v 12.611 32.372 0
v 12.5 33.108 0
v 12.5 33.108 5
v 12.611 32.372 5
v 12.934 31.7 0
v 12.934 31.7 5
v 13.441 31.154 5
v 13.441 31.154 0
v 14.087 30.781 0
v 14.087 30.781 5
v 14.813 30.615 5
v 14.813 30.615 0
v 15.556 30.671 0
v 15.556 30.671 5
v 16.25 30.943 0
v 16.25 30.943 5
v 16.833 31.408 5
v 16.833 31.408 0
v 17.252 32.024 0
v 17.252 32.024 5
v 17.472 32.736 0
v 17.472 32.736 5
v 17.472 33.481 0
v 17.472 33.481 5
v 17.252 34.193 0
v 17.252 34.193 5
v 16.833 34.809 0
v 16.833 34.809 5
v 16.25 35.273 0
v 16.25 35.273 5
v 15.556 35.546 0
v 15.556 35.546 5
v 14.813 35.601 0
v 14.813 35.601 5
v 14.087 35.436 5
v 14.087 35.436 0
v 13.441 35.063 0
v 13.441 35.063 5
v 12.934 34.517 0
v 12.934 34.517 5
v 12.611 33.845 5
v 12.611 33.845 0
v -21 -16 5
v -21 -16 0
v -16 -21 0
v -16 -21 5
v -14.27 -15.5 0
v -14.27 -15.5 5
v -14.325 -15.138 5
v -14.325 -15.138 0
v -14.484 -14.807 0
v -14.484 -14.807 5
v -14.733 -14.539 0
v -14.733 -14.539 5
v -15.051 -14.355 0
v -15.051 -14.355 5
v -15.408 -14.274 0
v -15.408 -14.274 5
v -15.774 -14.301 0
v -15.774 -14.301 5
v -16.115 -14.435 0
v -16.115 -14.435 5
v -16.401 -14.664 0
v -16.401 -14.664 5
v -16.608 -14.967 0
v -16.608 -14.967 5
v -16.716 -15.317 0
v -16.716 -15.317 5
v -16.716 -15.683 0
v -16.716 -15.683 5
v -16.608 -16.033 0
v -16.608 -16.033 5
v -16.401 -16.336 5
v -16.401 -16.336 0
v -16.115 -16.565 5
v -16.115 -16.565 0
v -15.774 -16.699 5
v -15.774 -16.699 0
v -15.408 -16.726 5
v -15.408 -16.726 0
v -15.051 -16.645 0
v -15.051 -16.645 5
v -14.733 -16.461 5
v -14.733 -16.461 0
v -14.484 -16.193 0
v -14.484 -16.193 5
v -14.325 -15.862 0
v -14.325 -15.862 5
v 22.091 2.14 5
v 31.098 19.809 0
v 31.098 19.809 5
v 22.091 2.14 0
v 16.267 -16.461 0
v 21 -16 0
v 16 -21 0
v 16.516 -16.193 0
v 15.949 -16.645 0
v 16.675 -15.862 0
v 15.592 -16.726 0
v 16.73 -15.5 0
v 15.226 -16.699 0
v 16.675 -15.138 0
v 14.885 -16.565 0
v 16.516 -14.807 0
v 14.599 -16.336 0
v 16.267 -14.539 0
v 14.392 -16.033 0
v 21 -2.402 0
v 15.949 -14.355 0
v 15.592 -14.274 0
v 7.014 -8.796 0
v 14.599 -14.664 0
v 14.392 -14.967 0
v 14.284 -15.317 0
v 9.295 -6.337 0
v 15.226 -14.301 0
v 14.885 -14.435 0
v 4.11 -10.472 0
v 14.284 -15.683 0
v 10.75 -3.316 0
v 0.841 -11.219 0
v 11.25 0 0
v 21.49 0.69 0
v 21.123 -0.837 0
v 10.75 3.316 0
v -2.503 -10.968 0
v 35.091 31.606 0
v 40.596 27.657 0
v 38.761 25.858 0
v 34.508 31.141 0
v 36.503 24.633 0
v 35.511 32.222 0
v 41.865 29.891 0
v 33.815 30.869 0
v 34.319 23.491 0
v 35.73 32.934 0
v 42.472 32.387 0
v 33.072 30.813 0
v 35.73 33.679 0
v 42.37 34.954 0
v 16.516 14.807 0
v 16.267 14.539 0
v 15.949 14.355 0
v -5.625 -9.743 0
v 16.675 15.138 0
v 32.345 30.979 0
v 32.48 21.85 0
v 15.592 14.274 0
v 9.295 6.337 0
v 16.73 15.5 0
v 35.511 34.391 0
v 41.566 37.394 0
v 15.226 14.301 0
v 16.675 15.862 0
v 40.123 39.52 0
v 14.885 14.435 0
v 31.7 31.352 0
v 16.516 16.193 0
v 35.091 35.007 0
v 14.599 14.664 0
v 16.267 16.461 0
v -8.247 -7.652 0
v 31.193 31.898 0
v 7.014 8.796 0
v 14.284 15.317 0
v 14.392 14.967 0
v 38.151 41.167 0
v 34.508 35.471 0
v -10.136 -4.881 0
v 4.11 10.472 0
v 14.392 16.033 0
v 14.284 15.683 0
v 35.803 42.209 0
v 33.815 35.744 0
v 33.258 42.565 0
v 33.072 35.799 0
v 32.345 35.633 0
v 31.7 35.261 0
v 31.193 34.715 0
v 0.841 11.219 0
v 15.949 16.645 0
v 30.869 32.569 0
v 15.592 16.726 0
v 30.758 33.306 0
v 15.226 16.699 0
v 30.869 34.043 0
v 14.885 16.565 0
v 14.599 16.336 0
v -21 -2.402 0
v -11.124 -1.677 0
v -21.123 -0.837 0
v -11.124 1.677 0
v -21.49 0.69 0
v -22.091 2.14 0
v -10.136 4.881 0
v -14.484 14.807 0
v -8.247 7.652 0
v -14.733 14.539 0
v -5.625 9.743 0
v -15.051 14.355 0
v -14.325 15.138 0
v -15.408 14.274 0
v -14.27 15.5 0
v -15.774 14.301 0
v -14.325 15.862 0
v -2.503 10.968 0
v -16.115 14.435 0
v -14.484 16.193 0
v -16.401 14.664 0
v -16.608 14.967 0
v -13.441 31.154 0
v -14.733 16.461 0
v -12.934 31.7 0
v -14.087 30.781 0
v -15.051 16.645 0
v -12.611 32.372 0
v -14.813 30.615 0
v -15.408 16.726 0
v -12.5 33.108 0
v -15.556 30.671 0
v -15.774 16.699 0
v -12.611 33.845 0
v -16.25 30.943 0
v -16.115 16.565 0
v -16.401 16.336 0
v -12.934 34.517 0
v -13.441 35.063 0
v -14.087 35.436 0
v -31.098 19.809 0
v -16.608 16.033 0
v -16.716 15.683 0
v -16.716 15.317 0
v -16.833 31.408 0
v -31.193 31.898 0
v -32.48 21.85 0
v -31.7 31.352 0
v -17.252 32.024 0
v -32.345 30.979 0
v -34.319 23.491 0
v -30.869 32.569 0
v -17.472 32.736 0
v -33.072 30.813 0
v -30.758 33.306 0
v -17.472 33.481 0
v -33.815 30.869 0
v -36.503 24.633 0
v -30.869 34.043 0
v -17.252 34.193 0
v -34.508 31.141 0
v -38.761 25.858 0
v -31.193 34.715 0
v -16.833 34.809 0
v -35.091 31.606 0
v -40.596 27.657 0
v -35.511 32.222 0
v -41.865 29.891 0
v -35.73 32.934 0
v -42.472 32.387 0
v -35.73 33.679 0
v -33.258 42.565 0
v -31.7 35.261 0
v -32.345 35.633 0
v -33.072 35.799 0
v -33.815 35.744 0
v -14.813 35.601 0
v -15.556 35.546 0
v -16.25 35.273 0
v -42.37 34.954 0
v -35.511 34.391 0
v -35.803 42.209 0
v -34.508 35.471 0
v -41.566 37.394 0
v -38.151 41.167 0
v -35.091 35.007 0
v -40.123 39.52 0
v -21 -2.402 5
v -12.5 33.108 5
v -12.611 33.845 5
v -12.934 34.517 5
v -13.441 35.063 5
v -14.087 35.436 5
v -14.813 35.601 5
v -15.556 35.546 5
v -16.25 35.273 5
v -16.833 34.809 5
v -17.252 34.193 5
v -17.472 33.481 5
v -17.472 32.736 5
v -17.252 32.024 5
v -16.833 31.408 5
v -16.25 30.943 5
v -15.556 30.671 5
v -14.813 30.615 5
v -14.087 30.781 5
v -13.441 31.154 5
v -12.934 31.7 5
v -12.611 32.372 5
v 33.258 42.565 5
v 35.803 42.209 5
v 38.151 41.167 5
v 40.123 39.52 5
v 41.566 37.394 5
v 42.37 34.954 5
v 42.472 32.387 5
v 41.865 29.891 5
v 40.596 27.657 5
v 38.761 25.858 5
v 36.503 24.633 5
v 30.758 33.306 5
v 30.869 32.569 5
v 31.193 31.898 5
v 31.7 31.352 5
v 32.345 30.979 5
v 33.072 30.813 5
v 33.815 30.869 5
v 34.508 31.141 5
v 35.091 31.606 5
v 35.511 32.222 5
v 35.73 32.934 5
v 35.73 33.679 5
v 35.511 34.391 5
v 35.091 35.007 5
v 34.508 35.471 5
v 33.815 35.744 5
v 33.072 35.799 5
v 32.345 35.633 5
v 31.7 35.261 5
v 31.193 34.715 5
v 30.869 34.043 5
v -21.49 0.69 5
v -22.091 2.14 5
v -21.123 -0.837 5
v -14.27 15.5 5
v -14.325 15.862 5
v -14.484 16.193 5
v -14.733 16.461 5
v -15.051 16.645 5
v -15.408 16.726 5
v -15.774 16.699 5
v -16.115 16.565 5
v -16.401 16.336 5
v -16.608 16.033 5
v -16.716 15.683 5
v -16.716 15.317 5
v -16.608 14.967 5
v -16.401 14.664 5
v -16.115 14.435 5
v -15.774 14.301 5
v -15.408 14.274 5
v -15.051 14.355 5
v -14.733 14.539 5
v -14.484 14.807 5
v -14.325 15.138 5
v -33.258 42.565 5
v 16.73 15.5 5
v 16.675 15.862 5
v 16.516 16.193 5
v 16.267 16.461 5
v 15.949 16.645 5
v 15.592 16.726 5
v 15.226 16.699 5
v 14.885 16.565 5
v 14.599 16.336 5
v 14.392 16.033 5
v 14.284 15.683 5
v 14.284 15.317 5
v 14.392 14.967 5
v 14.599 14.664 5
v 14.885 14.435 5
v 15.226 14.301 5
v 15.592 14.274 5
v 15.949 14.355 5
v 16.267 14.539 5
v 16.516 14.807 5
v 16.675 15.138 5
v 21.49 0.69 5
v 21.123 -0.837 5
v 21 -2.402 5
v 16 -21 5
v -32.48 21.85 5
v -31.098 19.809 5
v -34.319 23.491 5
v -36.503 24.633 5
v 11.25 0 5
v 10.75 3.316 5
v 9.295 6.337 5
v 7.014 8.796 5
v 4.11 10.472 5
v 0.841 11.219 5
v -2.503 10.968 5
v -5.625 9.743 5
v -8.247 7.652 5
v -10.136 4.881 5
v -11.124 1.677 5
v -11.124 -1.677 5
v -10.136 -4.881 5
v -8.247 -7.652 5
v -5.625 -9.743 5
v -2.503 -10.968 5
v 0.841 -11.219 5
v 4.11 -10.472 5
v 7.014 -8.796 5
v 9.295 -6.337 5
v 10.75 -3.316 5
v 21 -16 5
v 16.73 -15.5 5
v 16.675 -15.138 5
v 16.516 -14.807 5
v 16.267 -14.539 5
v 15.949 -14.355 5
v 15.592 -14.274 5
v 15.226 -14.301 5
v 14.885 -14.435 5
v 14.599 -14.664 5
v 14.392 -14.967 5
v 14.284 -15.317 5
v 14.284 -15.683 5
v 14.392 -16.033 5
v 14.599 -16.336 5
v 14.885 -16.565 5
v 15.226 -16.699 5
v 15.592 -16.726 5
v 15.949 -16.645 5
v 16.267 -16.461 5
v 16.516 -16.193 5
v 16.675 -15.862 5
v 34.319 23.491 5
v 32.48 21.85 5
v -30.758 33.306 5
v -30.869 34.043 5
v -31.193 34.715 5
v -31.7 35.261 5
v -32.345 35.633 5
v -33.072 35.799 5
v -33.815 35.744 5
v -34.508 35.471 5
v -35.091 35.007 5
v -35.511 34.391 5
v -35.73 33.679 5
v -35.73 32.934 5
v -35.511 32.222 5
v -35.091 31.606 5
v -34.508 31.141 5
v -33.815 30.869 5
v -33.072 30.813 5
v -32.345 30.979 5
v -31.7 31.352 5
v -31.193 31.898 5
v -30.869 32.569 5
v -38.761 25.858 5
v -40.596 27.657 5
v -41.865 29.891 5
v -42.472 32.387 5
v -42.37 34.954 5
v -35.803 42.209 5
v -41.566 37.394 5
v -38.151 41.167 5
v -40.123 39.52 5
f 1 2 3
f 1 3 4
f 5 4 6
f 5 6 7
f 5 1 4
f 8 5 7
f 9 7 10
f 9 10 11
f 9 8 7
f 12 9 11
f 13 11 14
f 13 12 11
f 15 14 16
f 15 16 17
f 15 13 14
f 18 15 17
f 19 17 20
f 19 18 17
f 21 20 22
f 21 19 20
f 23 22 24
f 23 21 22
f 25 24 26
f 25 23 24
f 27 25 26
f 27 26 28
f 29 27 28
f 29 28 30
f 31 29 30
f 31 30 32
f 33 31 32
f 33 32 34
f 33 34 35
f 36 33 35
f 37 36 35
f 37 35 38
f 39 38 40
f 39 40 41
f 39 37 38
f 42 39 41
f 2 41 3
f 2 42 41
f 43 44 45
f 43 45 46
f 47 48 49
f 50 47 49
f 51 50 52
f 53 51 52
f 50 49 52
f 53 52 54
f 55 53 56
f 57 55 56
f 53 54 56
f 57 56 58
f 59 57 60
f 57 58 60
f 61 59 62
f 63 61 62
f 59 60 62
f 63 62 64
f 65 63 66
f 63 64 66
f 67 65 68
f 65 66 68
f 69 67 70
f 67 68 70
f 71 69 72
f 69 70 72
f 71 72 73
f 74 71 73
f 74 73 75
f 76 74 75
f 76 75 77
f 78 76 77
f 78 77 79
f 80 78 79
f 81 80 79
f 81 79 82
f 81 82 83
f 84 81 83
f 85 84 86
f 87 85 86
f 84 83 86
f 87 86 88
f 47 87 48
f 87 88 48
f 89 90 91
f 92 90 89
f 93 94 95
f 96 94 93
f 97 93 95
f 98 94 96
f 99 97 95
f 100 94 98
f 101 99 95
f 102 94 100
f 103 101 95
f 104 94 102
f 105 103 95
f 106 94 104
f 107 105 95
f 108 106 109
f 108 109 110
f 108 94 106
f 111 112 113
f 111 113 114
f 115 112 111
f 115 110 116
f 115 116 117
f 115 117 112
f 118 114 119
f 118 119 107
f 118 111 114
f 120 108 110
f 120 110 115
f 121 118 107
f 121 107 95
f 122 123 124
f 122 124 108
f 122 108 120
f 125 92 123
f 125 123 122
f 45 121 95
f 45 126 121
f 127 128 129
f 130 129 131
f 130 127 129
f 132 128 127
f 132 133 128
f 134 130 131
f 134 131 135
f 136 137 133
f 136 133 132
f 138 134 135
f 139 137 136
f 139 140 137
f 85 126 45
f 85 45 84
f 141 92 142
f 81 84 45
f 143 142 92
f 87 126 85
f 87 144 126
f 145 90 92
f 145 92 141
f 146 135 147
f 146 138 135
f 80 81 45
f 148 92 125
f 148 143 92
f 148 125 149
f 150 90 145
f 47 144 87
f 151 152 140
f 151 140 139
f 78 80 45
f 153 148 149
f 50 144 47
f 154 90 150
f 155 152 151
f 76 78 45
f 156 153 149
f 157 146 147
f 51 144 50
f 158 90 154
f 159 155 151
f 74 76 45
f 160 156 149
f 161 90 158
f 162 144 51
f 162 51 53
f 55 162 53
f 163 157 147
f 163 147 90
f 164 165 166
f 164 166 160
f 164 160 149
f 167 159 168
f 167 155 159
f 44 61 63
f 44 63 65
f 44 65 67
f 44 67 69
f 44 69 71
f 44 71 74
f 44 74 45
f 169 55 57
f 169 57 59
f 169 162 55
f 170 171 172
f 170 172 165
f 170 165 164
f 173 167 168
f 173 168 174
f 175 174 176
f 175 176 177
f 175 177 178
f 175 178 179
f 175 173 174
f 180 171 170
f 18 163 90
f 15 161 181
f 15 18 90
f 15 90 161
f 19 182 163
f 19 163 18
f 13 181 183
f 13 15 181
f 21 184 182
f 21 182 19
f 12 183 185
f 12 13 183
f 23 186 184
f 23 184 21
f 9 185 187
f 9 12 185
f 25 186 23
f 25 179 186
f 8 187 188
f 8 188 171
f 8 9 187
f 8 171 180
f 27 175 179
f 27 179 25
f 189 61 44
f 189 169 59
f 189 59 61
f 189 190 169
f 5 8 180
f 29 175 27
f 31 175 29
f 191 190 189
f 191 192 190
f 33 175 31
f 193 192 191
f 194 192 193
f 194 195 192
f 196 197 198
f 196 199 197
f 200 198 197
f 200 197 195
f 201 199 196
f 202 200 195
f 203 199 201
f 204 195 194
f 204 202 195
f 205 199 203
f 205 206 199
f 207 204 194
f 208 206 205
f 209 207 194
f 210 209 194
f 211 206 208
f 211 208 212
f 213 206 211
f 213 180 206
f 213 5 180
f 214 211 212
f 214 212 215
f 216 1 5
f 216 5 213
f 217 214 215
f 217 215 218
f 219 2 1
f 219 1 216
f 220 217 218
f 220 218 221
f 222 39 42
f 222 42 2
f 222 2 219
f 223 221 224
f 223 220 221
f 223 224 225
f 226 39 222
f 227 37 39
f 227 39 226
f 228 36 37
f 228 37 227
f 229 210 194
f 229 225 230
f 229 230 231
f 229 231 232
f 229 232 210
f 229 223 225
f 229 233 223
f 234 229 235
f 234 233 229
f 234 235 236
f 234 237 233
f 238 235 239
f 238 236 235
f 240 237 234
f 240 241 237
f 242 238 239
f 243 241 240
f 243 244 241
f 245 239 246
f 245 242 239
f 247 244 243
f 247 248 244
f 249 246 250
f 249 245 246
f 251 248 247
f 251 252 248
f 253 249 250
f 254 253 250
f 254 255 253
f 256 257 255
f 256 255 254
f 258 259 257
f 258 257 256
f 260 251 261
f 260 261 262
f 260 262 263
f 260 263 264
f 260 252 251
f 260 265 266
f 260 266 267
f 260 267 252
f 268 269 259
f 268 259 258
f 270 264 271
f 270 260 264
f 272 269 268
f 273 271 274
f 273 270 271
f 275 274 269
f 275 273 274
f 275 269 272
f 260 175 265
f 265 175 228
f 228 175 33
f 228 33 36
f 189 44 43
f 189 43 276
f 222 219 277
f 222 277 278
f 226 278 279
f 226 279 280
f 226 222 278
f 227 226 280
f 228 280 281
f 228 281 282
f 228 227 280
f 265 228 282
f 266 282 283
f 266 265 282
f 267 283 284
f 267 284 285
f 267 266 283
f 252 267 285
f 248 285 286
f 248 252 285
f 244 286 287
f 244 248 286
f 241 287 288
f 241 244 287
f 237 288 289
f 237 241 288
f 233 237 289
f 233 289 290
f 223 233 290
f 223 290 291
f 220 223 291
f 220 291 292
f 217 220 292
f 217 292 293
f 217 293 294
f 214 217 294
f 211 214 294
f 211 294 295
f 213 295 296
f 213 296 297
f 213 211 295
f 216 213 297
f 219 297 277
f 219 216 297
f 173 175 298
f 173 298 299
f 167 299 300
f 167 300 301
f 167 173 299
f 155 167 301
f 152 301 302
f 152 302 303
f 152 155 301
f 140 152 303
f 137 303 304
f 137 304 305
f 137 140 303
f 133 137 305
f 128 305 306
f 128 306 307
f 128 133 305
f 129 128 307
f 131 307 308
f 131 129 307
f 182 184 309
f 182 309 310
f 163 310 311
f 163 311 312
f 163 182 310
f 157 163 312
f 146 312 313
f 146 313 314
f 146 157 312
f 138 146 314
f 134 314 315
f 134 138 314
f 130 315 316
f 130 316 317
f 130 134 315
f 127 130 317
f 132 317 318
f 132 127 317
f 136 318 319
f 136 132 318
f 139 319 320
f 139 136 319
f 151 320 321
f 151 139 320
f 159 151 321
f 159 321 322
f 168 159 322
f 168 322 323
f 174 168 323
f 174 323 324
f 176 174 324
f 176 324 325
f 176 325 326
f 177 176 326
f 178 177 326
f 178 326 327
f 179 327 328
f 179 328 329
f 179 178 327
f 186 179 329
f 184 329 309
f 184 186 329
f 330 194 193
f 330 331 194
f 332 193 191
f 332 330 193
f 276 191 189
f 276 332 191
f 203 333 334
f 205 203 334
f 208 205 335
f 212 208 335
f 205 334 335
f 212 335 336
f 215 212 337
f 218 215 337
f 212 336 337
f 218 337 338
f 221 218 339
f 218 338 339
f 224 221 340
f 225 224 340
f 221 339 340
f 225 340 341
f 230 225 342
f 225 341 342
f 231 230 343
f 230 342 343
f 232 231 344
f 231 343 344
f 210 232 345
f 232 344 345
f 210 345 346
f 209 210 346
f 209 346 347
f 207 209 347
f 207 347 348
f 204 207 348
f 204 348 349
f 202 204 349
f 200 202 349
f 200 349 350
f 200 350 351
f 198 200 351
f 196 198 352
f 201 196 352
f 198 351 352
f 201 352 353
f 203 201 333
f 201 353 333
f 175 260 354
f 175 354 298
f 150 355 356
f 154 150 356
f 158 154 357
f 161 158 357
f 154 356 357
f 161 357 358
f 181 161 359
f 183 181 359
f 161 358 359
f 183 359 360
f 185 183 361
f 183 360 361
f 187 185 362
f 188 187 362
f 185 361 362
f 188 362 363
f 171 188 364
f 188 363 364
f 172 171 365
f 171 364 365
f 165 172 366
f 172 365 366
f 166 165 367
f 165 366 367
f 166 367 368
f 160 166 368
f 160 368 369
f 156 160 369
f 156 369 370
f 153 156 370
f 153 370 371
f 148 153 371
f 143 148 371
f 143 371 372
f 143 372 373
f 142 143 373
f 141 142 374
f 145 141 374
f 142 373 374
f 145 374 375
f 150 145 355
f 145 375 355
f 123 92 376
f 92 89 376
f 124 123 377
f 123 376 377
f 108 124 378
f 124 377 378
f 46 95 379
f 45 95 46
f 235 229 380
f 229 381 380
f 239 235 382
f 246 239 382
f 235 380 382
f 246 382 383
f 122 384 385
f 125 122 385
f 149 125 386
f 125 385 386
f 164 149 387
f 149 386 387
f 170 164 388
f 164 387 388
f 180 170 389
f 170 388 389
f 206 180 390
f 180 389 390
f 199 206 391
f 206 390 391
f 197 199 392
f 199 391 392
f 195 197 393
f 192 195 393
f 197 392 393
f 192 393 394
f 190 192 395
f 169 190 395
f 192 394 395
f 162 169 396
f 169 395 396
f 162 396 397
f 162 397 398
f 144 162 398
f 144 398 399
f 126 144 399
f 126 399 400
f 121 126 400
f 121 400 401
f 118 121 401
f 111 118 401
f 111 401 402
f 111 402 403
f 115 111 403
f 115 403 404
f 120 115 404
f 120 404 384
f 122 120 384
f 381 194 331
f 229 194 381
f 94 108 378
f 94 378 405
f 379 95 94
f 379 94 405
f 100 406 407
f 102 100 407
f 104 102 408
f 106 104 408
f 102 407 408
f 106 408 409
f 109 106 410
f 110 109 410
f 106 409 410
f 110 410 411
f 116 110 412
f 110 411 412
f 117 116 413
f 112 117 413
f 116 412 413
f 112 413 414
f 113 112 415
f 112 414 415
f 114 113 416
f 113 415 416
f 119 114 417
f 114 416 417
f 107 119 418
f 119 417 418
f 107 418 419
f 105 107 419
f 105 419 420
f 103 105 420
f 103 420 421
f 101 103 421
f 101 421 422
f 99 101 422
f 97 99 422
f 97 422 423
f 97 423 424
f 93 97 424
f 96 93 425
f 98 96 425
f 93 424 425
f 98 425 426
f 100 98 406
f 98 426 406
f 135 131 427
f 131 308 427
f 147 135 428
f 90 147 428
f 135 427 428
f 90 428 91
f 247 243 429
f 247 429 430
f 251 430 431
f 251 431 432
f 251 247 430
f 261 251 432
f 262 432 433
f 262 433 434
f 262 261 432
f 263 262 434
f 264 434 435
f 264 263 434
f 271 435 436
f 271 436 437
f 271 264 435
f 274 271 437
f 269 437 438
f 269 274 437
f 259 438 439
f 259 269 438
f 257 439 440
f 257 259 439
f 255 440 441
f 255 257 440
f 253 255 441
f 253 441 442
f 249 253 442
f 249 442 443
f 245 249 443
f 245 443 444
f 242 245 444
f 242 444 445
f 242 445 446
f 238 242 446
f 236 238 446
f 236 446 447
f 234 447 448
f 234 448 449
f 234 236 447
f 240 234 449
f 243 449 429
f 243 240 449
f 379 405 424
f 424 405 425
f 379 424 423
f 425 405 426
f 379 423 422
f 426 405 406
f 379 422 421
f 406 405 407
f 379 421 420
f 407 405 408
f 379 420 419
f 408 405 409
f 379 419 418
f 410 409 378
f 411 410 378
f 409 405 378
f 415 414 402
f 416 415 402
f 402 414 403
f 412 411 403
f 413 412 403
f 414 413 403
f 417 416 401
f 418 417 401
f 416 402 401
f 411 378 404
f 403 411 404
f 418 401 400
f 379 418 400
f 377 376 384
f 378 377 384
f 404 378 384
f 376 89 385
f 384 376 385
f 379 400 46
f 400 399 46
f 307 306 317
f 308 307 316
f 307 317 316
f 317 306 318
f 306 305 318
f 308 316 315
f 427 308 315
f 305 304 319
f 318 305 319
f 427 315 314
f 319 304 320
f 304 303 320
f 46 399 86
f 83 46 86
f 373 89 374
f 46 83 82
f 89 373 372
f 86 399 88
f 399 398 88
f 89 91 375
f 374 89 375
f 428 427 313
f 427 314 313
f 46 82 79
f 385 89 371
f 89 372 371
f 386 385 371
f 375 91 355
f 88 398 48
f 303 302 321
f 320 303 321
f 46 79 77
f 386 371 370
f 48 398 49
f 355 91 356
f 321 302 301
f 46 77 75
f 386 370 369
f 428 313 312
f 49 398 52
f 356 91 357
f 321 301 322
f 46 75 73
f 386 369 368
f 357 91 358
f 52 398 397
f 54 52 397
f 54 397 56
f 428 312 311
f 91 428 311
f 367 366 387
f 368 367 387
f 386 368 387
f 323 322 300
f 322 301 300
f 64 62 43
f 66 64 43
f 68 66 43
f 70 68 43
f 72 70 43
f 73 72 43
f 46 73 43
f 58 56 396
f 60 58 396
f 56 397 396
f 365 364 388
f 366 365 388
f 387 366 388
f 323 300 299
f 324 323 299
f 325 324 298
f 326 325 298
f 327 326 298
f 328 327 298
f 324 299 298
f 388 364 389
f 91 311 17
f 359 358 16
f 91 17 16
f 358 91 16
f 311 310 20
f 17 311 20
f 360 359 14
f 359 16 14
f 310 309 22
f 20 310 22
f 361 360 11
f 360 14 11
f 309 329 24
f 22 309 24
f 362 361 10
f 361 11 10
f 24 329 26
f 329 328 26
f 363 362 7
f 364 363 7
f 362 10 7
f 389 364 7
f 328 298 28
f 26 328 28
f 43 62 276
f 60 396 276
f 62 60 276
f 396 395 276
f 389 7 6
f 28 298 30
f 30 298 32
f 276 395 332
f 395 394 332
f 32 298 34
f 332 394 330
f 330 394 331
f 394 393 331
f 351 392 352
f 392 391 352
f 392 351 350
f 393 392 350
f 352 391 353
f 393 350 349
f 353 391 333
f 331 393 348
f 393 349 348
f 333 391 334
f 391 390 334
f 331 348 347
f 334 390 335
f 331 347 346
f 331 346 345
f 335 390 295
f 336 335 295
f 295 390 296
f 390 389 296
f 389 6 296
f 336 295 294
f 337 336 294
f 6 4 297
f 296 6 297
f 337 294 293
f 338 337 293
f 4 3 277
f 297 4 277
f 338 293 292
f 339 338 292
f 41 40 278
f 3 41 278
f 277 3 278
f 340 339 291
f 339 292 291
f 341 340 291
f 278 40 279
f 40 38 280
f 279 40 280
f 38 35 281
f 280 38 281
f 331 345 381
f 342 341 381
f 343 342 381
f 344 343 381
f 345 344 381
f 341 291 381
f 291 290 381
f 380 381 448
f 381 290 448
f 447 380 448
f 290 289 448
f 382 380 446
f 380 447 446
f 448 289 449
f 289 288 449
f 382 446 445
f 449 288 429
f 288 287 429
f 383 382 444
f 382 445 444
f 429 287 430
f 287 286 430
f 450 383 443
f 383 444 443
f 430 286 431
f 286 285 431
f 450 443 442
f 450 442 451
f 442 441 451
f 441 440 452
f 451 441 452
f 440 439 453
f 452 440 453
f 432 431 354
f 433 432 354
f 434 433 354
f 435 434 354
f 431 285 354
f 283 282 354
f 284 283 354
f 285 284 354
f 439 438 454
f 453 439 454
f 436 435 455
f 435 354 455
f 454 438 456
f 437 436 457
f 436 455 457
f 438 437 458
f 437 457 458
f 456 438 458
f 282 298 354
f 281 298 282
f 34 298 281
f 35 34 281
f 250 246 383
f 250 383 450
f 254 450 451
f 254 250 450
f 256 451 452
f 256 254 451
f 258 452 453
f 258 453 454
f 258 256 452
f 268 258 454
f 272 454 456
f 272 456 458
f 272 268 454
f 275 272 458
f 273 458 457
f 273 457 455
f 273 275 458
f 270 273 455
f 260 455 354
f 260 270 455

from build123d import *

# Parameters (mm, degrees)
ESQUISSE1_R             = 7.48734248
ESQUISSE1_R_2           = 2.5
BOSS_EXTRU_1_DEPTH      = 5
ESQUISSE2_R             = 1.2295
ENL_V_MAT_EXTRU_1_DEPTH = 5
CONG_2_R                = 10
CONG_3_R                = 10
ESQUISSE3_R             = 11.25
ENL_V_MAT_EXTRU_2_DEPTH = 10
CHANFREIN1_SIZE         = 5


with BuildPart() as part:
    # Esquisse1 → Boss.-Extru.1 (new body)
    with BuildSketch(Plane.XY):
        with BuildLine():
            Line((-33.258331918, 42.564920159), (33.258331918, 42.564920159))
            ThreePointArc((33.258331918, 42.564920159), (42.517839876, 33.305412201), (33.258331918, 24.045904244))
            Line((33.258331918, 24.045904244), (21, 0))
            Line((21, 0), (21, -21))
            Line((21, -21), (-21, -21))
            Line((-21, -21), (-21, 0))
            Line((-21, 0), (-33.258331918, 24.045904244))
            ThreePointArc((-33.258331918, 24.045904244), (-42.517839876, 33.305412201), (-33.258331918, 42.564920159))
        make_face()
        Circle(ESQUISSE1_R, mode=Mode.SUBTRACT)
        with Locations((-33.258331918, 33.306233754)):
            Circle(ESQUISSE1_R_2, mode=Mode.SUBTRACT)
        with Locations(Location((33.258331918, 33.306233754, 0), (0, 0, 180))):
            Circle(ESQUISSE1_R_2, mode=Mode.SUBTRACT)
        with Locations((-15, 33.108389008)):
            Circle(ESQUISSE1_R_2, mode=Mode.SUBTRACT)
        with Locations(Location((15, 33.108389008, 0), (0, 0, 180))):
            Circle(ESQUISSE1_R_2, mode=Mode.SUBTRACT)
    extrude(amount=BOSS_EXTRU_1_DEPTH)

    # Esquisse2 → Enlèv. mat.-Extru.1 (cut)
    with BuildSketch(Plane.XY.offset(5)):
        with Locations((-15.5, 15.5)):
            Circle(ESQUISSE2_R)
        with Locations((15.5, 15.5)):
            Circle(ESQUISSE2_R)
        with Locations((-15.5, -15.5)):
            Circle(ESQUISSE2_R)
        with Locations((15.5, -15.5)):
            Circle(ESQUISSE2_R)
    extrude(amount=-ENL_V_MAT_EXTRU_1_DEPTH, mode=Mode.SUBTRACT)

    # Congé2
    cong_2_edges = [part.edges().sort_by_distance(p)[0] for p in [
        (-21, 0, 2.5),
        (21, 0, 2.5),
    ]]
    fillet(cong_2_edges, radius=CONG_2_R)

    # Congé3
    cong_3_edges = [part.edges().sort_by_distance(p)[0] for p in [
        (-33.258331918, 24.045904244, 2.5),
        (33.258331918, 24.045904244, 2.5),
    ]]
    fillet(cong_3_edges, radius=CONG_3_R)

    # Esquisse3 → Enlèv. mat.-Extru.2 (cut)
    with BuildSketch(Plane.XY.offset(5)):
        Circle(ESQUISSE3_R)
    extrude(amount=-ENL_V_MAT_EXTRU_2_DEPTH, mode=Mode.SUBTRACT)

    # Chanfrein1
    chanfrein1_edges = [part.edges().sort_by_distance(p)[0] for p in [
        (21, -21, 2.5),
        (-21, -21, 2.5),
    ]]
    chamfer(chanfrein1_edges, length=CHANFREIN1_SIZE)


solid = part.part
